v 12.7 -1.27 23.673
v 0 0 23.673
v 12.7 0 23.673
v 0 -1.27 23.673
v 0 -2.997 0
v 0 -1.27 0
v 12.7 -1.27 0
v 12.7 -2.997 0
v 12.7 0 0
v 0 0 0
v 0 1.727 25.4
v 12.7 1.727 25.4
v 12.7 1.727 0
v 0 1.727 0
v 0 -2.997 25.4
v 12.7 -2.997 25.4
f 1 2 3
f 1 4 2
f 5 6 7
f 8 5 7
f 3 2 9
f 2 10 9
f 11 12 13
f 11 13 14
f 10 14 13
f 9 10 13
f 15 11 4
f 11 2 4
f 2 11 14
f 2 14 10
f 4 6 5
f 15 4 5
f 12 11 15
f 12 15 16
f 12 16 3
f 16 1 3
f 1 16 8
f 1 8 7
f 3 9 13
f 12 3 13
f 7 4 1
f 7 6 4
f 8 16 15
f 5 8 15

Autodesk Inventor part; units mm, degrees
ref_plane "YZ Plane" through (0, 0, 0) normal (1, 0, 0) x (0, 1, 0)
ref_plane "XY Plane" through (0, 0, 0) normal (0, 0, 1) x (1, 0, 0)
sketch "Sketch1" plane through (0, 0, 0) normal (0, 0, 1) x (1, 0, 0)
  line L0 (0, 0) -> (12.7, 0)
  line L1 (12.7, 0) -> (12.7, 1.7272)
  line L2 (12.7, 1.7272) -> (0, 1.7272)
  line L3 (0, 1.7272) -> (0, 0)
  line L4 (0, -1.27) -> (12.7, -1.27)
  line L5 (12.7, -1.27) -> (12.7, -2.9972)
  line L6 (12.7, -2.9972) -> (0, -2.9972)
  line L7 (0, -2.9972) -> (0, -1.27)
  dimension "d0" = 12.7
  dimension "d1" = 1.7272
  dimension "d2" = 12.7
  dimension "d3" = 1.7272
  dimension "d4" = 1.27
ref_plane "Work Plane1" through (0, -0.635, 0) normal (0, 1, 0) x (-1, 0, 0)
sketch "Sketch2" plane through (0, -0.635, 0) normal (0, 1, 0) x (-1, 0, 0)
  line L0 (0, 23.6728) -> (-12.7, 23.6728)
  line L1 (-12.7, 23.6728) -> (-12.7, 25.4)
  line L2 (-12.7, 25.4) -> (0, 25.4)
  line L3 (0, 25.4) -> (0, 23.6728)
  point P0 (0, 0)
  point P1 (0, 24.5364)
  dimension "d6" = 12.7
  dimension "d7" = 1.7272
  dimension "d10" = 25.4
extrude "Extrusion1" add sketch "Sketch1" along normal blind 25.4
extrude "Extrusion2" add sketch "Sketch2" along normal blind 1.27 and the other way blind 1.27
properties part number "ClipConnector"
